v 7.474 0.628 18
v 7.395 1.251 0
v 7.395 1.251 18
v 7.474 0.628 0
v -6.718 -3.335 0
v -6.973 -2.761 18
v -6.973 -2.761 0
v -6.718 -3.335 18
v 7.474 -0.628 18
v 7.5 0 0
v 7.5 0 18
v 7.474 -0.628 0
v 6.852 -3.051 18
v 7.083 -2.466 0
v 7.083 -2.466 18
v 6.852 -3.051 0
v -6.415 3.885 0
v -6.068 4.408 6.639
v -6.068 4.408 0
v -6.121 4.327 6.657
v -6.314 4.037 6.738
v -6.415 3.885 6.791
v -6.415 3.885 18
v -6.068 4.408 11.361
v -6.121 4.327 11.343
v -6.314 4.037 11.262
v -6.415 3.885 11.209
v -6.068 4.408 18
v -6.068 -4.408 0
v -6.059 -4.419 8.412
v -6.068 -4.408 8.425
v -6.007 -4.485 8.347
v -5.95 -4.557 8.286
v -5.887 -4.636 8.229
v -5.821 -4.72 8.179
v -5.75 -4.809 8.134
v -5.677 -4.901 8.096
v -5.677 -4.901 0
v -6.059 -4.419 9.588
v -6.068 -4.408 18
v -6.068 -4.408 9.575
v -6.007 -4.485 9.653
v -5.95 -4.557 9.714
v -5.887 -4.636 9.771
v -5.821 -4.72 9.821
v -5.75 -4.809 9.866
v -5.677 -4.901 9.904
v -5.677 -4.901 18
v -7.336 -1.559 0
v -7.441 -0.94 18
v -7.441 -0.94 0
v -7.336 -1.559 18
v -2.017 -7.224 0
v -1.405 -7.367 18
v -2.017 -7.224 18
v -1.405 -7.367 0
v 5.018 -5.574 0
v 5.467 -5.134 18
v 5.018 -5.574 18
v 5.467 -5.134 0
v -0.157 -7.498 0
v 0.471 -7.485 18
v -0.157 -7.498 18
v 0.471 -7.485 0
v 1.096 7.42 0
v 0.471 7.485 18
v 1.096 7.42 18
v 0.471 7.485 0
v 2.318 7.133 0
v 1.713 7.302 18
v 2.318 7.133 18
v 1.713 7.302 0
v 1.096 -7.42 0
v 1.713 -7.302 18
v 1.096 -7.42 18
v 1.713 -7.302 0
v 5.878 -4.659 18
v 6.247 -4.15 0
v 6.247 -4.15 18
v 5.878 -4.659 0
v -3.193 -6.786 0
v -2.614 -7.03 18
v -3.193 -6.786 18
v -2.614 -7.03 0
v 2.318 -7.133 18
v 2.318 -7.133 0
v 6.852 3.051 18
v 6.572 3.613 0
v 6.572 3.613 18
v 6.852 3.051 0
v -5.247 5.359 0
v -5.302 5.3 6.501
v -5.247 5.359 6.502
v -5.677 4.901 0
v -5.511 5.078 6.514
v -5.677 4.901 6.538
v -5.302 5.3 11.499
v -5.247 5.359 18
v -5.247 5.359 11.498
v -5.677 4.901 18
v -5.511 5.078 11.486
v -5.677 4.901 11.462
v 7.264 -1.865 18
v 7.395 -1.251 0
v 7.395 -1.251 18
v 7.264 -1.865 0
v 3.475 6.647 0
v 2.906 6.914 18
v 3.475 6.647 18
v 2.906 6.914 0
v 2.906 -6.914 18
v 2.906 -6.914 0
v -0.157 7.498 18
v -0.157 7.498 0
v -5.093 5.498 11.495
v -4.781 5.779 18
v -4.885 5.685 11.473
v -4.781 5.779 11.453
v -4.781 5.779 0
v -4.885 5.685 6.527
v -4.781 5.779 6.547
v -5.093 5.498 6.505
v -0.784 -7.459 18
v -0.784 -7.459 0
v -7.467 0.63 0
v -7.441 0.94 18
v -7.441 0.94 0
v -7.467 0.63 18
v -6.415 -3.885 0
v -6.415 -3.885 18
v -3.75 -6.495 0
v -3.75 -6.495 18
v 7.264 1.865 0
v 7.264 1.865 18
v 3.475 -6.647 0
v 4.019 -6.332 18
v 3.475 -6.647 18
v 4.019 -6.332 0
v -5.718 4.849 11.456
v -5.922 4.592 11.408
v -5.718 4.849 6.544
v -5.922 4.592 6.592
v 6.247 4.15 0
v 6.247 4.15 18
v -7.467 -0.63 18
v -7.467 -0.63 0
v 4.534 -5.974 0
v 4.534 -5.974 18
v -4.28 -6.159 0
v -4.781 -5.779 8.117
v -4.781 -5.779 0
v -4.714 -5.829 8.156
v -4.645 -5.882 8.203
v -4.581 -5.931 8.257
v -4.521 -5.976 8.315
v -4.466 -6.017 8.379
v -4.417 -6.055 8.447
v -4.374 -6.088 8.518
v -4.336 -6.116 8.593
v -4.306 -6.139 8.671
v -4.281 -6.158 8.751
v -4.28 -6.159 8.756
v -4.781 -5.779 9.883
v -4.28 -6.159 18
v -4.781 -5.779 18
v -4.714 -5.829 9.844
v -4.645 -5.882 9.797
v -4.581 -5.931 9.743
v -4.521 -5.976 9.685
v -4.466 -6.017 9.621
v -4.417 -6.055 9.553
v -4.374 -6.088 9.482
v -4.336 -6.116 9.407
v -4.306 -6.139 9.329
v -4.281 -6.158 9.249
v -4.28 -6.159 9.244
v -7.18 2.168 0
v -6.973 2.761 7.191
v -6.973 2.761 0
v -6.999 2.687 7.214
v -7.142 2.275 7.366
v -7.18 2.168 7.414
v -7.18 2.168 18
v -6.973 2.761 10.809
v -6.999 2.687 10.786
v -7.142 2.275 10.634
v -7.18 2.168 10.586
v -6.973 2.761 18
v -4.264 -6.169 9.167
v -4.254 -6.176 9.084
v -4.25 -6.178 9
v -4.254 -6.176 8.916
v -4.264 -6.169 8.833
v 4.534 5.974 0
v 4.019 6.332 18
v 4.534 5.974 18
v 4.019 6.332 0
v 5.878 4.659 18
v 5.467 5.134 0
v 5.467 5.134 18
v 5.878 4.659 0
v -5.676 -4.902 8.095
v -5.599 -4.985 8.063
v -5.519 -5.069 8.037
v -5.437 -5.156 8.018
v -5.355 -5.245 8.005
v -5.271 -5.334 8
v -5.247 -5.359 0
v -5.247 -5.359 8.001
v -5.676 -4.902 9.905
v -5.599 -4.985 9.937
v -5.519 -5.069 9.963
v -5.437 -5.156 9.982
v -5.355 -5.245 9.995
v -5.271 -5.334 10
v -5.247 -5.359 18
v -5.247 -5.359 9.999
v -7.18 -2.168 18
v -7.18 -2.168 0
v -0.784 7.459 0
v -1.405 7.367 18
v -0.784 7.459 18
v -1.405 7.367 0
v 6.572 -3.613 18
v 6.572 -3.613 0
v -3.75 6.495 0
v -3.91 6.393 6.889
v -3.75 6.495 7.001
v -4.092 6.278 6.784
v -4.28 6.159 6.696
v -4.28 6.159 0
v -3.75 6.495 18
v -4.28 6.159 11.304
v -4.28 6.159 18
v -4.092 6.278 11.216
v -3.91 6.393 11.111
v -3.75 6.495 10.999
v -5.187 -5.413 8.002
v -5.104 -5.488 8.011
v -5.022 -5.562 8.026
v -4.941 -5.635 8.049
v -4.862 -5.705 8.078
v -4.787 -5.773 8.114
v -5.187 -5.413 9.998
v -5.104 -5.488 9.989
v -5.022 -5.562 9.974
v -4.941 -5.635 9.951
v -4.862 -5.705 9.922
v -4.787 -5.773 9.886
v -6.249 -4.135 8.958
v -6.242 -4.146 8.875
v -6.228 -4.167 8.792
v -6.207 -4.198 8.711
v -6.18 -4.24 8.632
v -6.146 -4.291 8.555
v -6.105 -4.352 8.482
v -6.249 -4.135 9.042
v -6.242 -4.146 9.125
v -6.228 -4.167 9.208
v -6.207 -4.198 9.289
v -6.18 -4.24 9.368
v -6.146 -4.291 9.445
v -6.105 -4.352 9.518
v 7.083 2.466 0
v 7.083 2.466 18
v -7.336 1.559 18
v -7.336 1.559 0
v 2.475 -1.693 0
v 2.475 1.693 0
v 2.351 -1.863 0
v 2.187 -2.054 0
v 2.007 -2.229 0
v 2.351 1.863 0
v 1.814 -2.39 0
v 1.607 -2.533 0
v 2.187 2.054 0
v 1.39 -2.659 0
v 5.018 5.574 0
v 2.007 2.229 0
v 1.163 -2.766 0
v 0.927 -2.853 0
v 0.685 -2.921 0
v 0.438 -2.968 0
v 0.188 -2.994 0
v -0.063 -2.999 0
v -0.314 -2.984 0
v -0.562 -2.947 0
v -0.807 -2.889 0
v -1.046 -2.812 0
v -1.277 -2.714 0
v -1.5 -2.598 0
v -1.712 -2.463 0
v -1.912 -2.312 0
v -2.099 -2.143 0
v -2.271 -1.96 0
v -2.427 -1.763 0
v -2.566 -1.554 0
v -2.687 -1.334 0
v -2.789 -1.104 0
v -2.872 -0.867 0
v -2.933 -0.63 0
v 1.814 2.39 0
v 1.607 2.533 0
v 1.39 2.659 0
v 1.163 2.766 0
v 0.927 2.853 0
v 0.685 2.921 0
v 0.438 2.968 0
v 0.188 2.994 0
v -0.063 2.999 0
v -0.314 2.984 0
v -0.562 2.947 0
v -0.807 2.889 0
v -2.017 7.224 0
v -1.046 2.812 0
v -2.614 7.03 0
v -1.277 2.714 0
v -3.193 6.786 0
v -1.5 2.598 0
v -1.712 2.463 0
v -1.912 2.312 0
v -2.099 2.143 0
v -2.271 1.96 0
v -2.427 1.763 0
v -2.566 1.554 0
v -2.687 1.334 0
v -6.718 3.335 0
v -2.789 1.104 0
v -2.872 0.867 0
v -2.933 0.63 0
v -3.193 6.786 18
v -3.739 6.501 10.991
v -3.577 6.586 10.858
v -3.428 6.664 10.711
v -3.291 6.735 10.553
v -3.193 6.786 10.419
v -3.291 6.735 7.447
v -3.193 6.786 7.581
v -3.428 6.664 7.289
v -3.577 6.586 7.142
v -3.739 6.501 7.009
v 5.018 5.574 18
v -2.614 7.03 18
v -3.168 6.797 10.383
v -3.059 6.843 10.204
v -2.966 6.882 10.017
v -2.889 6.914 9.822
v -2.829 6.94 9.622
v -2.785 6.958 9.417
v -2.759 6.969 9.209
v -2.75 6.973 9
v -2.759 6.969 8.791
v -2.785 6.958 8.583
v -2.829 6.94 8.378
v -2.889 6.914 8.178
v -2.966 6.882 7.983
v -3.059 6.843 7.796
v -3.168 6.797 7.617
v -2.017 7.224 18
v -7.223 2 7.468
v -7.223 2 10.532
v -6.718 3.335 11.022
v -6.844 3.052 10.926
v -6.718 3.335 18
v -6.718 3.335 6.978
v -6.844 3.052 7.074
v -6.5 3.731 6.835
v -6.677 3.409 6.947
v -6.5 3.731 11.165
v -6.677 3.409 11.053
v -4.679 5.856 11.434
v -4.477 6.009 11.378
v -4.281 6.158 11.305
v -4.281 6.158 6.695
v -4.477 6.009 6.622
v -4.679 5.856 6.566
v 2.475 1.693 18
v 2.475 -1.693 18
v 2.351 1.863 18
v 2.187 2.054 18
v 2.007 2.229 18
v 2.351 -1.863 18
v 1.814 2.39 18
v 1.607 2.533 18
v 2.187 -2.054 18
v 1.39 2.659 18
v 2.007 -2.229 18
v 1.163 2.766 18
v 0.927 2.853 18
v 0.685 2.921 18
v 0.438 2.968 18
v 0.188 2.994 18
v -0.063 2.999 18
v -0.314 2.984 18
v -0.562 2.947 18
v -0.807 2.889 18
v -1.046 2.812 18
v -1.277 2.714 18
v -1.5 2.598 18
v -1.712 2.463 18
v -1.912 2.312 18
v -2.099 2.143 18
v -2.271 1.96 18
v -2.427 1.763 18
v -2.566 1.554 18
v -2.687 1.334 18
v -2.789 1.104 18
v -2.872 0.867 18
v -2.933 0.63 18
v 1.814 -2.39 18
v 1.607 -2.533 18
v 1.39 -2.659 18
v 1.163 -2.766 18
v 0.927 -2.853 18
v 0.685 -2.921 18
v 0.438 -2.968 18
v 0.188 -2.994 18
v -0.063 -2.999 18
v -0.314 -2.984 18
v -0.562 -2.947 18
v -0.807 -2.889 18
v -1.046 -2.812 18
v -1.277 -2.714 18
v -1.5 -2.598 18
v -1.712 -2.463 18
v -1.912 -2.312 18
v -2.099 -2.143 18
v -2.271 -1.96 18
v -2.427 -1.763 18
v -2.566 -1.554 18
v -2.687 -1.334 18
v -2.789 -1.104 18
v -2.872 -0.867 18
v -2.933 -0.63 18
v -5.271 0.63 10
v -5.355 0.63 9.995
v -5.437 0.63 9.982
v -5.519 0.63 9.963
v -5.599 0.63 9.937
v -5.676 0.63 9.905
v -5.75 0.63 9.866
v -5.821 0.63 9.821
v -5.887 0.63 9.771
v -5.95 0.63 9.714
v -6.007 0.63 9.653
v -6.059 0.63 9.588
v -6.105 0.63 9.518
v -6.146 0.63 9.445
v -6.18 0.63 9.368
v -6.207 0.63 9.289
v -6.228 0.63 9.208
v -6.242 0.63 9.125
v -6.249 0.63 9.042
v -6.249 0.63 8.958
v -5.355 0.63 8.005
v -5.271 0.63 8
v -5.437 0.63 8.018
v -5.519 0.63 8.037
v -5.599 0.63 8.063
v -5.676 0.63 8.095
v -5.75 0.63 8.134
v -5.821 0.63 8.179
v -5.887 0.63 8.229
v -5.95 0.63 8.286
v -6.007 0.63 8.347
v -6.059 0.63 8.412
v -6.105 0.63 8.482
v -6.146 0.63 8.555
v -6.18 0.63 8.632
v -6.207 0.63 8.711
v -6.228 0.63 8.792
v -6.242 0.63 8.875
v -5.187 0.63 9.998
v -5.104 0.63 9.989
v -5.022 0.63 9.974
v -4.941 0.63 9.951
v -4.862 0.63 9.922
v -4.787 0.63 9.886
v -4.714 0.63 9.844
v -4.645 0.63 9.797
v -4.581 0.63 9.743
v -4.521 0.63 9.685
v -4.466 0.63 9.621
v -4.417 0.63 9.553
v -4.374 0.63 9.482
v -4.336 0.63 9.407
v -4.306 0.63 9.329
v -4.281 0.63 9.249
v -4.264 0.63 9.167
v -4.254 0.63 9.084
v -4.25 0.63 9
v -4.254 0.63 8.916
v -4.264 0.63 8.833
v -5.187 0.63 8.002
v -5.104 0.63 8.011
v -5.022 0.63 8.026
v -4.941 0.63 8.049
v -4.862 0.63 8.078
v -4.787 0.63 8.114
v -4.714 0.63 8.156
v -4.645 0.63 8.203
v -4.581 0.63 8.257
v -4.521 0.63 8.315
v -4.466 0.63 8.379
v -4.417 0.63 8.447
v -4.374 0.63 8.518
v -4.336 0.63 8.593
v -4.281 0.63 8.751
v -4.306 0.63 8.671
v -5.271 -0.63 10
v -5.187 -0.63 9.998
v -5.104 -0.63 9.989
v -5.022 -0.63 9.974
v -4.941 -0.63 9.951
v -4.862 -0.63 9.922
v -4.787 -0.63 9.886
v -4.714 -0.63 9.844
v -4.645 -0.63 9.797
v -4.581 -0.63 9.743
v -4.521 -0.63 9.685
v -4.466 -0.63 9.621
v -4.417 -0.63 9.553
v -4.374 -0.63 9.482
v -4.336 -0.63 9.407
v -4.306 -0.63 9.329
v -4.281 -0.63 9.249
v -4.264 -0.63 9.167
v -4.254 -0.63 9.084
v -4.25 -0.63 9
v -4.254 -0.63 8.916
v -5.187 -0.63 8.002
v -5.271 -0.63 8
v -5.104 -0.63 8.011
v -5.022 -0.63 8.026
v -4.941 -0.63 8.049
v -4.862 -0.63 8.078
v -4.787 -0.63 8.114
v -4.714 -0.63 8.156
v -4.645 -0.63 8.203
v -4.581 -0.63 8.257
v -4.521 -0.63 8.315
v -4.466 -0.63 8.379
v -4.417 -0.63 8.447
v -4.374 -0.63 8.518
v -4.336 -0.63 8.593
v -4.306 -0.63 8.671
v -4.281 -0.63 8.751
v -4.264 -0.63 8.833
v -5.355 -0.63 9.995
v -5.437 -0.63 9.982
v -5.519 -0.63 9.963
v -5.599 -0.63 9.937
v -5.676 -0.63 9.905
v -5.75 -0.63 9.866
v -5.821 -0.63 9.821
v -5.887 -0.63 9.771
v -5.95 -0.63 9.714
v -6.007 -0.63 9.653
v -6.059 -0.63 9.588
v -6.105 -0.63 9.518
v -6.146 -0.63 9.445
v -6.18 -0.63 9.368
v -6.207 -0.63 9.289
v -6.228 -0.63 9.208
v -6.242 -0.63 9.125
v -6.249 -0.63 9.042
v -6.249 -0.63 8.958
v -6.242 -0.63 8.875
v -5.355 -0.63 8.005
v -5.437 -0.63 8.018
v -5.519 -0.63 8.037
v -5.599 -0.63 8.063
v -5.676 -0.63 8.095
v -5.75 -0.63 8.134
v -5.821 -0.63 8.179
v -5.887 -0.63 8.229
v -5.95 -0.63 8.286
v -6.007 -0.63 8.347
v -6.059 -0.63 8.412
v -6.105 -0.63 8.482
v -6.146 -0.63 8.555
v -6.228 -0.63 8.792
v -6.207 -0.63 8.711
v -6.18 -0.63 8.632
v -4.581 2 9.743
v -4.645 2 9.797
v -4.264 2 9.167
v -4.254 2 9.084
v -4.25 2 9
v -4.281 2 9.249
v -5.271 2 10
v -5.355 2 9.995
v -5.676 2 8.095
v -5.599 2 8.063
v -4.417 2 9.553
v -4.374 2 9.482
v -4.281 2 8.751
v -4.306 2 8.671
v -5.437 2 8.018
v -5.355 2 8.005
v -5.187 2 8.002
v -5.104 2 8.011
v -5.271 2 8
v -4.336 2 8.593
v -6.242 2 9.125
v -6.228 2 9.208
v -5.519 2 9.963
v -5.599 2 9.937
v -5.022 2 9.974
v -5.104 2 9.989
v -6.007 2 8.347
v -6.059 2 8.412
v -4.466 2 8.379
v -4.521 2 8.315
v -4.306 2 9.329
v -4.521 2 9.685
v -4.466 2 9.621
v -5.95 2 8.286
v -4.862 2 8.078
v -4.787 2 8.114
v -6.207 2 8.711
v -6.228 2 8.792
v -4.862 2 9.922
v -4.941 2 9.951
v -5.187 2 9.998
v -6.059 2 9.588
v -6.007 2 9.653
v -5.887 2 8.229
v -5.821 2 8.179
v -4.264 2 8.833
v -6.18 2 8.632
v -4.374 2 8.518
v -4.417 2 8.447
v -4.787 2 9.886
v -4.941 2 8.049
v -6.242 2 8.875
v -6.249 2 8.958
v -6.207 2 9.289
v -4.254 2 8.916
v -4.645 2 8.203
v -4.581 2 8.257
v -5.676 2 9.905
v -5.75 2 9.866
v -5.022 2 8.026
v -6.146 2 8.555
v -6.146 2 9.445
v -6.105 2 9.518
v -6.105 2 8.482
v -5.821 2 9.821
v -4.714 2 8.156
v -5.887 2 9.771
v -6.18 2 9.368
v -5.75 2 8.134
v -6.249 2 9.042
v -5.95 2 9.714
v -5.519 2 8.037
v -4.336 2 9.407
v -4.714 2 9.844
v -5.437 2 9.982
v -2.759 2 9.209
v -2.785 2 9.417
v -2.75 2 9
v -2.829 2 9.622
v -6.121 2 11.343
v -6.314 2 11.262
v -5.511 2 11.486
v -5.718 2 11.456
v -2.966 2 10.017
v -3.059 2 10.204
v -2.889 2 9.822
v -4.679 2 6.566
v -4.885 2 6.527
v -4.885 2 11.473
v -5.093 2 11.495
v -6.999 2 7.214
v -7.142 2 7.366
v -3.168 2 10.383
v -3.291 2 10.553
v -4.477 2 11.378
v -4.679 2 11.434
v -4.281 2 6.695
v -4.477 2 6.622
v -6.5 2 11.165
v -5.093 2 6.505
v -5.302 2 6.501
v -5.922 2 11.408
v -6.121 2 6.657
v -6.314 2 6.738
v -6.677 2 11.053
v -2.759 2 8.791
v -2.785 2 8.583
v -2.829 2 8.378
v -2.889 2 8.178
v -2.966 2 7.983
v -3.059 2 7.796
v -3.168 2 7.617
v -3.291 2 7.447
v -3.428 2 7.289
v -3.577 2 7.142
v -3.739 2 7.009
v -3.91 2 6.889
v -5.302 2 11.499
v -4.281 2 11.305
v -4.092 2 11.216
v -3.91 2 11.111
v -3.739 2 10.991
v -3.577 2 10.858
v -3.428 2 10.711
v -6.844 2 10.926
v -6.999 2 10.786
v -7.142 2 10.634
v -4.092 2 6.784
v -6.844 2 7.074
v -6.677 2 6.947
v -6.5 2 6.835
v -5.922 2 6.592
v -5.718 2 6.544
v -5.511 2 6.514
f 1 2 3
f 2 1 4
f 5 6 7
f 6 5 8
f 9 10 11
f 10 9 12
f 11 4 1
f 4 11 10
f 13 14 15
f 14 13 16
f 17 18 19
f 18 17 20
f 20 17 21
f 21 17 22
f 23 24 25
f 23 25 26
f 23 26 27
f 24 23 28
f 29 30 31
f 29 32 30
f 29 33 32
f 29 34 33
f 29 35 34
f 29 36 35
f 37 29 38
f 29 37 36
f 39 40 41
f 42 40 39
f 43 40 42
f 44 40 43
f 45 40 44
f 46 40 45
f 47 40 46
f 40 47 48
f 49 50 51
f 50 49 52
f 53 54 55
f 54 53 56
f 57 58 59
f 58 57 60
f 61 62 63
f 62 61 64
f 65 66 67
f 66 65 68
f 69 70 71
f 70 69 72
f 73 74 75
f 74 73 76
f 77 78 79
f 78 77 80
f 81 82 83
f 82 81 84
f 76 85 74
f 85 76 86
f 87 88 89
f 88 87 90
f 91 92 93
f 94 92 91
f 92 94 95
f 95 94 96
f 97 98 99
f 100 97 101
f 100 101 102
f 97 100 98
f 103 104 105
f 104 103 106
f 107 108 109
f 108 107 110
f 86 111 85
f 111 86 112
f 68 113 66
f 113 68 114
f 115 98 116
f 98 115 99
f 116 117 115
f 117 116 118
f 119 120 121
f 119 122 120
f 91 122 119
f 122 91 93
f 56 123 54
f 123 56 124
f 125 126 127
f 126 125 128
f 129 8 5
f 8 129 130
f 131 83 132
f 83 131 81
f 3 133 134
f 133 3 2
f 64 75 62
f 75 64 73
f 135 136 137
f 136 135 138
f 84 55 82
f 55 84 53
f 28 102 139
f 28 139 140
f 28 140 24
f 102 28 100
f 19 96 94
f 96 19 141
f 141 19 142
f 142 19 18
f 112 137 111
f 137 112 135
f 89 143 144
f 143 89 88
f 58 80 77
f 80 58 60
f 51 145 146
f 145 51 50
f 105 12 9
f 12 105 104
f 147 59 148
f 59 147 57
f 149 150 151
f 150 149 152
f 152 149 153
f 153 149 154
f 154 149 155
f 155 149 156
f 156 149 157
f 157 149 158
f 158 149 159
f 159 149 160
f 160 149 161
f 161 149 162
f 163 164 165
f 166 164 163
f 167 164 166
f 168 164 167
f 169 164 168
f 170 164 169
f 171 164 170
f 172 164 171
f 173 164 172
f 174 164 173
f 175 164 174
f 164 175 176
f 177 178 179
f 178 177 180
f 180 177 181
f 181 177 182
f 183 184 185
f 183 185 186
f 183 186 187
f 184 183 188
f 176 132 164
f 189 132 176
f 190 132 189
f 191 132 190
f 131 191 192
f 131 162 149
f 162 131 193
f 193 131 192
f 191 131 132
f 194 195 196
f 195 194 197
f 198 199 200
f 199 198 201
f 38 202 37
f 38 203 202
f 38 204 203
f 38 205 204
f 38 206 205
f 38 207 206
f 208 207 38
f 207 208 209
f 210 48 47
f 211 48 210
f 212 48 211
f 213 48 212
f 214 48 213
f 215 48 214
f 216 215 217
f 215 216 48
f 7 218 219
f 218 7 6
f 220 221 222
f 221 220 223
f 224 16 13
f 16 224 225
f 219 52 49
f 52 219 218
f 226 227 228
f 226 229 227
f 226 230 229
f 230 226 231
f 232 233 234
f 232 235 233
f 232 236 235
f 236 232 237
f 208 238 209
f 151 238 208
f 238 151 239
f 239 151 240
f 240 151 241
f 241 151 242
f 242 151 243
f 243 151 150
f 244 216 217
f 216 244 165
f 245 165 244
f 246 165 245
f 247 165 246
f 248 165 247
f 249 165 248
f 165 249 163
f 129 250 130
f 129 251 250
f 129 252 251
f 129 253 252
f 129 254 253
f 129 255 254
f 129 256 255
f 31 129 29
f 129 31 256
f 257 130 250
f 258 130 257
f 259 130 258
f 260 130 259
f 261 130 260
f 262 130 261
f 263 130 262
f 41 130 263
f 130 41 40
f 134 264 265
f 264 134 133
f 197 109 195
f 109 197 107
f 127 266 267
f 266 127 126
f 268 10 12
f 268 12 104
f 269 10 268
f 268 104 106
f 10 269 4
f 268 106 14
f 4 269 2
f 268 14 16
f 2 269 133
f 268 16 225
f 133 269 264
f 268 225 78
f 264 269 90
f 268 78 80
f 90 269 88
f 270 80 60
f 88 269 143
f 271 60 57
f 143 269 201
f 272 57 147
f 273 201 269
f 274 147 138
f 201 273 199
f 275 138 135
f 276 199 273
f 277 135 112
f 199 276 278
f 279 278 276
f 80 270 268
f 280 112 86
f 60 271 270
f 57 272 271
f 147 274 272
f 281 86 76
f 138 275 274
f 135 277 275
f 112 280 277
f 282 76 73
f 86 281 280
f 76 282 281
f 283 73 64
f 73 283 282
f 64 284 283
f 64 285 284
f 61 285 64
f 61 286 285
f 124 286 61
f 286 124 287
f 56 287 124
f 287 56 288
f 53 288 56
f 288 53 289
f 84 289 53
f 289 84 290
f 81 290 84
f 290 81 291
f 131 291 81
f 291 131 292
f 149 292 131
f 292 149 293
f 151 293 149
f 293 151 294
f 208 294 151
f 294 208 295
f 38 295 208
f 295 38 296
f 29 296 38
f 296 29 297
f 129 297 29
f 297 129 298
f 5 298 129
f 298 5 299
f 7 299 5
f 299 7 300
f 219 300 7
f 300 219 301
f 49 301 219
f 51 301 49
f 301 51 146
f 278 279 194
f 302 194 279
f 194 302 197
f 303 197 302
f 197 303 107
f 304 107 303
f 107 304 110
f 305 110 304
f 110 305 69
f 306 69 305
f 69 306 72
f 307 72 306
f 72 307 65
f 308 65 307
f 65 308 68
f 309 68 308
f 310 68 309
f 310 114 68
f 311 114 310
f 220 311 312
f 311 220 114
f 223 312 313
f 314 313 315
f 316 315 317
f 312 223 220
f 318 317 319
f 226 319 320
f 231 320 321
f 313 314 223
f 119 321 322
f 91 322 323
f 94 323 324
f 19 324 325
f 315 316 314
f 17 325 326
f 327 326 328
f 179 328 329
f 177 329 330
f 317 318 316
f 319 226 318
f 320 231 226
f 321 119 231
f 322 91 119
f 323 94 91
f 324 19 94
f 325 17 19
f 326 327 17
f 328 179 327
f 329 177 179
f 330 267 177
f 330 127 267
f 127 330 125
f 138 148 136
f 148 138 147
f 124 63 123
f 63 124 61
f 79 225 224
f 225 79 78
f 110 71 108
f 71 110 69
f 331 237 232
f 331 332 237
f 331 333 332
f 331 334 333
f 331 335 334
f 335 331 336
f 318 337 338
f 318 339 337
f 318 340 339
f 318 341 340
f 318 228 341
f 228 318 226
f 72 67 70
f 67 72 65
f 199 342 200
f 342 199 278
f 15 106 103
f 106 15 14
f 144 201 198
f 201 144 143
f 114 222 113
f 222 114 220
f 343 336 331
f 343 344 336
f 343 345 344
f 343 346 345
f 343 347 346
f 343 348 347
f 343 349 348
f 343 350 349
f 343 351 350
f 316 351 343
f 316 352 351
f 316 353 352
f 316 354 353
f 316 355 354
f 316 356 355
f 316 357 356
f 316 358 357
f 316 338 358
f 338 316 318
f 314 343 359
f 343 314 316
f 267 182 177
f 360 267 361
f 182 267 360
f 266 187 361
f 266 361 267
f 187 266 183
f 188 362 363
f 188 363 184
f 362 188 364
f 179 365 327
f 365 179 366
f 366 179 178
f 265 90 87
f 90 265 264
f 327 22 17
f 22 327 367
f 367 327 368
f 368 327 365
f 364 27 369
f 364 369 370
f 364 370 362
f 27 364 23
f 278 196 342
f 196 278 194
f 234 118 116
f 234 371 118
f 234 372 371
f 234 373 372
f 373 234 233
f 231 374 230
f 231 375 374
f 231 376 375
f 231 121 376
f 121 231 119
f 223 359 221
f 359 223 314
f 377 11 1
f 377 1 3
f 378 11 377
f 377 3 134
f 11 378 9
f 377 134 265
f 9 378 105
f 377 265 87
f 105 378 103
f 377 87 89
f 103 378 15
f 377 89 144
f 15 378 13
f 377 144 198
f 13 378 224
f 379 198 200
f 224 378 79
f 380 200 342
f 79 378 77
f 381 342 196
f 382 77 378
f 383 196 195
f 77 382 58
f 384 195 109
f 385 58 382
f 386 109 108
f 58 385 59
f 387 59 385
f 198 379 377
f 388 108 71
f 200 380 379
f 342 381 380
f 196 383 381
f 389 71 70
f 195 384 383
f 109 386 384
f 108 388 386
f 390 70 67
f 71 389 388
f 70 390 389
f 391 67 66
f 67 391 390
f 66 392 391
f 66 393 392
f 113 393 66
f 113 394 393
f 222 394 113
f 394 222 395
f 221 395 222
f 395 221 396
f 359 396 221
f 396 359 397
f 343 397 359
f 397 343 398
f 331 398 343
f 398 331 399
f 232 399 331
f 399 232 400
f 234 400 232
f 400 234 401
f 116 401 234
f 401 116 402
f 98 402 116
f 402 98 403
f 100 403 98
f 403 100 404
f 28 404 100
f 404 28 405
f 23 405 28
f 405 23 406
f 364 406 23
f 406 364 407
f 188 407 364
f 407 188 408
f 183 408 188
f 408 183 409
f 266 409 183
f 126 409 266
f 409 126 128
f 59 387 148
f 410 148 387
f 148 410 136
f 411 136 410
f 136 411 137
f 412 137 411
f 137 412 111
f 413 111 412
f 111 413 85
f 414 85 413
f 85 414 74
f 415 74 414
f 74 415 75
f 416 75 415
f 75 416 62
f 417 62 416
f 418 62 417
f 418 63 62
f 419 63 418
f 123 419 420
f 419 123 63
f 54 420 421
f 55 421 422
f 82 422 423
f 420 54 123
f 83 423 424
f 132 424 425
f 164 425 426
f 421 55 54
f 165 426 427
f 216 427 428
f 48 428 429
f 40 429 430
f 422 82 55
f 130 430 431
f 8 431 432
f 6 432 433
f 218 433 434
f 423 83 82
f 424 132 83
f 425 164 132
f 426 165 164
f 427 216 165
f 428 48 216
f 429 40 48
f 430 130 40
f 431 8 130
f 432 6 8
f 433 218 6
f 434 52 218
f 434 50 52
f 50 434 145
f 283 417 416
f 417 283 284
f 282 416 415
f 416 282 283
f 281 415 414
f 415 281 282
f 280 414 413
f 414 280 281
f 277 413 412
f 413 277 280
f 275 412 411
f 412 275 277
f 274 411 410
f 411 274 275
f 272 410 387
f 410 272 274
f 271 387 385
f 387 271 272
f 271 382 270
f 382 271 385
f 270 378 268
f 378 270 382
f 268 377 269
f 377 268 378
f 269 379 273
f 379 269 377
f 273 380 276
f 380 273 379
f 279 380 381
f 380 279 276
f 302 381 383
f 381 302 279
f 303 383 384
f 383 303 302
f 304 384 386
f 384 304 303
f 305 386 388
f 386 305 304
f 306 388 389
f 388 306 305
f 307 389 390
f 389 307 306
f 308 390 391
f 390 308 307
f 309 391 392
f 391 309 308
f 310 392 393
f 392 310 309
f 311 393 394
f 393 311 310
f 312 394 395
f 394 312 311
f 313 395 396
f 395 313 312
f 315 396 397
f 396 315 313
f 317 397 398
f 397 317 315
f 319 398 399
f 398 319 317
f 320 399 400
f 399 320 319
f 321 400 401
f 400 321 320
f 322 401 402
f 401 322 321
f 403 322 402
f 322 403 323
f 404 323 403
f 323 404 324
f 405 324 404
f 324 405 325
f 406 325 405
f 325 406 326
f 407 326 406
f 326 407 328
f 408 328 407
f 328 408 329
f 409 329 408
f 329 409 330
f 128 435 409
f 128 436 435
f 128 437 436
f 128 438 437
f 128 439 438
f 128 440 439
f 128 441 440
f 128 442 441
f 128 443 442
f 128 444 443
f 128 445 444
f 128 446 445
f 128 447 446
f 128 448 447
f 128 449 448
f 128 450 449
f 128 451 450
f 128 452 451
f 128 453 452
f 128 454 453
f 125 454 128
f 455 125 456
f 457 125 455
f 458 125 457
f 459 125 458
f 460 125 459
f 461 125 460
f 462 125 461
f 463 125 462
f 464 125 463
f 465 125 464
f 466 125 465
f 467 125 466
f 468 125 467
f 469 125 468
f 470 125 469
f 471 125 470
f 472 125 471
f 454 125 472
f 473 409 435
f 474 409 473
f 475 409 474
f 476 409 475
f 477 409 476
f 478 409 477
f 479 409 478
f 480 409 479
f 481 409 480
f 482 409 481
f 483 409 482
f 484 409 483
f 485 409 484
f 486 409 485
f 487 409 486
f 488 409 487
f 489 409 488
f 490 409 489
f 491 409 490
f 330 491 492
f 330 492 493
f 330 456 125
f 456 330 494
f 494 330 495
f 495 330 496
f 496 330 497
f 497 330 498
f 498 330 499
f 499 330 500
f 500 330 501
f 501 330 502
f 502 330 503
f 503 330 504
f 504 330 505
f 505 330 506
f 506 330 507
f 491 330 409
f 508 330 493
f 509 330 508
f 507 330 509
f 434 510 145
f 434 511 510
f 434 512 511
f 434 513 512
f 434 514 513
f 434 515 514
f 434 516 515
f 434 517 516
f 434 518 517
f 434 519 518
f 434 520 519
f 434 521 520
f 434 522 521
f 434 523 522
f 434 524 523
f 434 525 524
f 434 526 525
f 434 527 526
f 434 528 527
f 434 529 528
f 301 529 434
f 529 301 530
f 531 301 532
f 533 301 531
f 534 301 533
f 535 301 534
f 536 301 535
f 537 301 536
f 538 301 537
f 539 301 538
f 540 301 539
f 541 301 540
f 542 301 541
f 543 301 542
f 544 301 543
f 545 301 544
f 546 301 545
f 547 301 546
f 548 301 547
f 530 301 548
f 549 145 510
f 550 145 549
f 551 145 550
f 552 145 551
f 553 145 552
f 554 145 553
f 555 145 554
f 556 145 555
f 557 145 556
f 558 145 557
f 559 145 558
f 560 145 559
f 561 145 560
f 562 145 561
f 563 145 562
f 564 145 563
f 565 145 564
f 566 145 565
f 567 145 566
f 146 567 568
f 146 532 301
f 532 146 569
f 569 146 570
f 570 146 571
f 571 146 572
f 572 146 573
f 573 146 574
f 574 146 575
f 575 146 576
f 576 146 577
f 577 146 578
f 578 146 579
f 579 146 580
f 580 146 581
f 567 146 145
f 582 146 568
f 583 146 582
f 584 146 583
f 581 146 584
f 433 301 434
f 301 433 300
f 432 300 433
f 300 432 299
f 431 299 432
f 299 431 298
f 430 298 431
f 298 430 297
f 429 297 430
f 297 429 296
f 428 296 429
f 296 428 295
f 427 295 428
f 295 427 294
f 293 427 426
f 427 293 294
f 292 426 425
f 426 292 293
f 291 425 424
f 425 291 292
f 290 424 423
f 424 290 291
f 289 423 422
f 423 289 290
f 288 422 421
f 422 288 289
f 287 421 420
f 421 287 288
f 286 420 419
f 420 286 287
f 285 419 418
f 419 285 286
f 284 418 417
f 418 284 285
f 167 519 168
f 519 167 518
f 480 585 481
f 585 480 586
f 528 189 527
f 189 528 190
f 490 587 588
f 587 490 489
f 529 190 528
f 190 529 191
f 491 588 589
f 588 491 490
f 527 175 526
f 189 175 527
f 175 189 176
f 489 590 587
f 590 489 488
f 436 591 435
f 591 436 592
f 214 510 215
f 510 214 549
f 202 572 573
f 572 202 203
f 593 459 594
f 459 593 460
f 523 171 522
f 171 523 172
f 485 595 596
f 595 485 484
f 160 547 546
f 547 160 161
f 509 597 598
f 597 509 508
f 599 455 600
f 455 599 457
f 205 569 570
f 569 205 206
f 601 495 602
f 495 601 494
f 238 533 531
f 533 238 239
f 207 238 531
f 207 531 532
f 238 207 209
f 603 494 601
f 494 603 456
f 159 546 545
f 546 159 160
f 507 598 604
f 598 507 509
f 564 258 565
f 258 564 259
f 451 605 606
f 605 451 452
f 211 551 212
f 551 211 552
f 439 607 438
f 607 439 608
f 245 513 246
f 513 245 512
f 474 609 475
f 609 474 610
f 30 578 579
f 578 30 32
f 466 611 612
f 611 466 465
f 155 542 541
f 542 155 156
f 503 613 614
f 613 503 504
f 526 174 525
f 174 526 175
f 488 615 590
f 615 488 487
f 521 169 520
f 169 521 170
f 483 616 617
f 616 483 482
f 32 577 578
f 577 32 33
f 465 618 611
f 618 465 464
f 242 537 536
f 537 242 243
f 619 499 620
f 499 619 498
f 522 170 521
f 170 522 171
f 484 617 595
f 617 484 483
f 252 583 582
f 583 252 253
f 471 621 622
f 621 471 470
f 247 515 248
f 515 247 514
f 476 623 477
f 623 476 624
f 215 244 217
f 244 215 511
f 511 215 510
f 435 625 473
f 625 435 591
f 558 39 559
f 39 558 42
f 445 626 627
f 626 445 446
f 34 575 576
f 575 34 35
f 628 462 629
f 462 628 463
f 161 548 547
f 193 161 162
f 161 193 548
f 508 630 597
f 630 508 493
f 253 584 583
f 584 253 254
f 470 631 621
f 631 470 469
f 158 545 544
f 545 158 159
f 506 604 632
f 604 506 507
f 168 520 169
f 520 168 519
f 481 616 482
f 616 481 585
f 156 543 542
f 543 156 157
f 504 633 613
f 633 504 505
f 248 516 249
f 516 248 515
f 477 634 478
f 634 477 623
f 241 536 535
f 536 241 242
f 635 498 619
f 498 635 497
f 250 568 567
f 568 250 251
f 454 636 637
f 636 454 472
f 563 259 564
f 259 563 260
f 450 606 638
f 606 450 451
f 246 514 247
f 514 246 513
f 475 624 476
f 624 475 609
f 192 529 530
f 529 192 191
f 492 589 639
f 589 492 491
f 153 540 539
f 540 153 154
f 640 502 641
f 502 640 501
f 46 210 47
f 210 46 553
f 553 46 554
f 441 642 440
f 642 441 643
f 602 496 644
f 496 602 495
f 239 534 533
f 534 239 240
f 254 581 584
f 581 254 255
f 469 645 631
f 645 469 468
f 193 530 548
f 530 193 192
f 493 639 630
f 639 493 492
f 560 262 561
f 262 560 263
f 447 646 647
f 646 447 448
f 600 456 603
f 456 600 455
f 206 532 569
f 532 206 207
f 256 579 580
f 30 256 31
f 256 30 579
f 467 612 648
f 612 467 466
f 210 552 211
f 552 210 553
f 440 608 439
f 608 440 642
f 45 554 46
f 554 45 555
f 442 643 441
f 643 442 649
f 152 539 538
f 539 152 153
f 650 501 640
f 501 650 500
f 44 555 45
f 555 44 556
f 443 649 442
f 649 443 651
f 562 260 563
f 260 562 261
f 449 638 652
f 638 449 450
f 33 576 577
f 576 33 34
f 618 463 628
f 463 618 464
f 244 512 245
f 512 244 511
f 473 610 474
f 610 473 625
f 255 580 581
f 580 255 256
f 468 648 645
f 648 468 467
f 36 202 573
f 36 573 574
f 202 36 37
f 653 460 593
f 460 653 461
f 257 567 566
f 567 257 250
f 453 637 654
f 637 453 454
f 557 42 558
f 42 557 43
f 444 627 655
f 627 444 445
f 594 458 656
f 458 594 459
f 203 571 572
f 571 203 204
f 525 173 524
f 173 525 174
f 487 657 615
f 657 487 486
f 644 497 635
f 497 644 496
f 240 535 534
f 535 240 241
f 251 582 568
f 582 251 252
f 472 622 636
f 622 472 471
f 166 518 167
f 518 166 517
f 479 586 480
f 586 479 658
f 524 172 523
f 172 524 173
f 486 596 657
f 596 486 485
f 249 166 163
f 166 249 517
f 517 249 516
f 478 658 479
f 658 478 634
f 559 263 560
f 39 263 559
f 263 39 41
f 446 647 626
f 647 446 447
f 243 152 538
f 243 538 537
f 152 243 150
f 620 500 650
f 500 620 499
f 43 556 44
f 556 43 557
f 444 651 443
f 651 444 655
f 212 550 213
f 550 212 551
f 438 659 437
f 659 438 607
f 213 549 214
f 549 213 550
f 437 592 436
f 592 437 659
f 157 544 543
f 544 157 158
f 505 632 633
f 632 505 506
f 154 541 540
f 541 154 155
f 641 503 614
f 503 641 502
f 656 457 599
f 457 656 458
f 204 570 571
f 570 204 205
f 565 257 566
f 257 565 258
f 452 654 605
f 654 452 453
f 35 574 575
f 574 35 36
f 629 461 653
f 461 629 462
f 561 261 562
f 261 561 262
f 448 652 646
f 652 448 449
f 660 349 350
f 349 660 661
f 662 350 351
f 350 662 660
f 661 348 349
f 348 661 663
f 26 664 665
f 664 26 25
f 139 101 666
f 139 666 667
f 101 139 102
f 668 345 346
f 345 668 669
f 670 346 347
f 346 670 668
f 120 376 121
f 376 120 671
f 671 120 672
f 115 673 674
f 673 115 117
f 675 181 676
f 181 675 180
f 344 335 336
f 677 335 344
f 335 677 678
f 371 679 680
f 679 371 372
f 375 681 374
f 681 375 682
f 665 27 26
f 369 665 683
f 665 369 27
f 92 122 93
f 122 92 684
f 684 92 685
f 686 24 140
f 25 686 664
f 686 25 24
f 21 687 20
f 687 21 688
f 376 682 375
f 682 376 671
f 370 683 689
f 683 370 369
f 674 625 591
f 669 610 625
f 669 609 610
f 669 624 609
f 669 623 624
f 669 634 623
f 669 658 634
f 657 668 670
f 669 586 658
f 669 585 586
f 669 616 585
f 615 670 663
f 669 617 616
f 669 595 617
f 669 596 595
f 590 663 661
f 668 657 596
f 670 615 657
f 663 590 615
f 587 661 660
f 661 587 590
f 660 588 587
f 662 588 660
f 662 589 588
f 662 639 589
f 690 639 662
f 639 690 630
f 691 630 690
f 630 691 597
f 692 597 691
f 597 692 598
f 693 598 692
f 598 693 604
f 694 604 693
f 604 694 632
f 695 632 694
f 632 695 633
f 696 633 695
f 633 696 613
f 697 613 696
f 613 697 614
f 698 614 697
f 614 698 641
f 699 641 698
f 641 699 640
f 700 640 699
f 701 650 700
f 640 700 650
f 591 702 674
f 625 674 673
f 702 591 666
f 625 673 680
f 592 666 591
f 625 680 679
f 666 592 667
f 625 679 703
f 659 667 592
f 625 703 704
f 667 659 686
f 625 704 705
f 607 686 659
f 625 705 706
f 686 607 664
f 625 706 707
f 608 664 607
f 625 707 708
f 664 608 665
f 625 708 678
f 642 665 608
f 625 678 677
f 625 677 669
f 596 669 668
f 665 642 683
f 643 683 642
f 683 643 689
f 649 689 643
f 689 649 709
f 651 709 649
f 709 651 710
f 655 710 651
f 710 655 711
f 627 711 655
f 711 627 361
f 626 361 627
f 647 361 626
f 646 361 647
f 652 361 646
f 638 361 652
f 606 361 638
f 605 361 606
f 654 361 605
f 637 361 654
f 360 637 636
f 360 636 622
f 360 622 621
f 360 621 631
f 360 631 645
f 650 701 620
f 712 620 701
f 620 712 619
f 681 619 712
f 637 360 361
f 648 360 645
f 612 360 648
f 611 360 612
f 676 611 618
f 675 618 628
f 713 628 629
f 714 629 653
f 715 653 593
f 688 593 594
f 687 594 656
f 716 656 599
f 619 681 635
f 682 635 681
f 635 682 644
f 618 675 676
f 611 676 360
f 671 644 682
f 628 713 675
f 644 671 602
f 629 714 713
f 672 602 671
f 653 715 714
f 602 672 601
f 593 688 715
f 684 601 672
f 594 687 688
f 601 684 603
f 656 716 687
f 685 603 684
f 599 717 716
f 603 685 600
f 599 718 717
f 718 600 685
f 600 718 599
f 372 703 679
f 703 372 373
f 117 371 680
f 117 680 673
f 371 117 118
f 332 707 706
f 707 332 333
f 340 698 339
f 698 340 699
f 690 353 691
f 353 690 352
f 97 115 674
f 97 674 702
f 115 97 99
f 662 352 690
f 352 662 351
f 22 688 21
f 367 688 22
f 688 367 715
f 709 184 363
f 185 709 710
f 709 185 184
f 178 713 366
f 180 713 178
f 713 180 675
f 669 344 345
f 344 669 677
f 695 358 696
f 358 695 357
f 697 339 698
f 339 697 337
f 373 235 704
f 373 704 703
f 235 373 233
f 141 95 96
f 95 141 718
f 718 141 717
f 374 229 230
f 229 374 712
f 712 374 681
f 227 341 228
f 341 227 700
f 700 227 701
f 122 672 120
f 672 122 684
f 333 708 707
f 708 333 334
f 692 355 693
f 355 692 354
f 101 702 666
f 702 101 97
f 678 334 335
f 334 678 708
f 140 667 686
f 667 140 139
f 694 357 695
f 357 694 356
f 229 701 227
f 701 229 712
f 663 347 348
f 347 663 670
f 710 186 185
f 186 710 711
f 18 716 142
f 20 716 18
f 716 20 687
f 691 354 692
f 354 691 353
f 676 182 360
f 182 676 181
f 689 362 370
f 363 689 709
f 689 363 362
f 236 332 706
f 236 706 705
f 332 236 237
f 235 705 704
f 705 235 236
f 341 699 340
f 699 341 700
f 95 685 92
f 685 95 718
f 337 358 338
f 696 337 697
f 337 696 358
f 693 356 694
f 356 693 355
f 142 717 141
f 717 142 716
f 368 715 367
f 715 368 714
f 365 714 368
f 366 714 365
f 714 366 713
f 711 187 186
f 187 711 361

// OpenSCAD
$fn = 75;

module spool(){
    shaftRad    = 6/2;
    spoolRad    = 7.5;
    shaftDrad   = .5 + (5.45 - (shaftRad/2))/2;
    spoolHeight = 18;
    cutSize     = 1.26; //size of winding nylon
    
    difference(){
    
        //spool
        linear_extrude(spoolHeight)
        circle(spoolRad);
        
        //cut
        translate([0,0,-5])
        linear_extrude(spoolHeight+10)
        difference(){
            union(){
                circle(shaftRad);
                translate([-20,-(cutSize/2)])
                    square([20, cutSize]);
            }
            translate([shaftDrad, -5]){
                square(10,10);
            }
        }
        
        //screw holes
        translate([-spoolRad/2-1.5, 0, spoolHeight/2])
            rotate([90,0,0])
                cylinder(spoolHeight, 1, 1, center=true);
        //screw head void
        #translate([-spoolRad/2-1.5, shaftRad+spoolHeight/2-1, spoolHeight/2])
            rotate([90,0,0])
                cylinder(spoolHeight, 2.5, 2.5, center=true);
    }
    
}
    
spool();
